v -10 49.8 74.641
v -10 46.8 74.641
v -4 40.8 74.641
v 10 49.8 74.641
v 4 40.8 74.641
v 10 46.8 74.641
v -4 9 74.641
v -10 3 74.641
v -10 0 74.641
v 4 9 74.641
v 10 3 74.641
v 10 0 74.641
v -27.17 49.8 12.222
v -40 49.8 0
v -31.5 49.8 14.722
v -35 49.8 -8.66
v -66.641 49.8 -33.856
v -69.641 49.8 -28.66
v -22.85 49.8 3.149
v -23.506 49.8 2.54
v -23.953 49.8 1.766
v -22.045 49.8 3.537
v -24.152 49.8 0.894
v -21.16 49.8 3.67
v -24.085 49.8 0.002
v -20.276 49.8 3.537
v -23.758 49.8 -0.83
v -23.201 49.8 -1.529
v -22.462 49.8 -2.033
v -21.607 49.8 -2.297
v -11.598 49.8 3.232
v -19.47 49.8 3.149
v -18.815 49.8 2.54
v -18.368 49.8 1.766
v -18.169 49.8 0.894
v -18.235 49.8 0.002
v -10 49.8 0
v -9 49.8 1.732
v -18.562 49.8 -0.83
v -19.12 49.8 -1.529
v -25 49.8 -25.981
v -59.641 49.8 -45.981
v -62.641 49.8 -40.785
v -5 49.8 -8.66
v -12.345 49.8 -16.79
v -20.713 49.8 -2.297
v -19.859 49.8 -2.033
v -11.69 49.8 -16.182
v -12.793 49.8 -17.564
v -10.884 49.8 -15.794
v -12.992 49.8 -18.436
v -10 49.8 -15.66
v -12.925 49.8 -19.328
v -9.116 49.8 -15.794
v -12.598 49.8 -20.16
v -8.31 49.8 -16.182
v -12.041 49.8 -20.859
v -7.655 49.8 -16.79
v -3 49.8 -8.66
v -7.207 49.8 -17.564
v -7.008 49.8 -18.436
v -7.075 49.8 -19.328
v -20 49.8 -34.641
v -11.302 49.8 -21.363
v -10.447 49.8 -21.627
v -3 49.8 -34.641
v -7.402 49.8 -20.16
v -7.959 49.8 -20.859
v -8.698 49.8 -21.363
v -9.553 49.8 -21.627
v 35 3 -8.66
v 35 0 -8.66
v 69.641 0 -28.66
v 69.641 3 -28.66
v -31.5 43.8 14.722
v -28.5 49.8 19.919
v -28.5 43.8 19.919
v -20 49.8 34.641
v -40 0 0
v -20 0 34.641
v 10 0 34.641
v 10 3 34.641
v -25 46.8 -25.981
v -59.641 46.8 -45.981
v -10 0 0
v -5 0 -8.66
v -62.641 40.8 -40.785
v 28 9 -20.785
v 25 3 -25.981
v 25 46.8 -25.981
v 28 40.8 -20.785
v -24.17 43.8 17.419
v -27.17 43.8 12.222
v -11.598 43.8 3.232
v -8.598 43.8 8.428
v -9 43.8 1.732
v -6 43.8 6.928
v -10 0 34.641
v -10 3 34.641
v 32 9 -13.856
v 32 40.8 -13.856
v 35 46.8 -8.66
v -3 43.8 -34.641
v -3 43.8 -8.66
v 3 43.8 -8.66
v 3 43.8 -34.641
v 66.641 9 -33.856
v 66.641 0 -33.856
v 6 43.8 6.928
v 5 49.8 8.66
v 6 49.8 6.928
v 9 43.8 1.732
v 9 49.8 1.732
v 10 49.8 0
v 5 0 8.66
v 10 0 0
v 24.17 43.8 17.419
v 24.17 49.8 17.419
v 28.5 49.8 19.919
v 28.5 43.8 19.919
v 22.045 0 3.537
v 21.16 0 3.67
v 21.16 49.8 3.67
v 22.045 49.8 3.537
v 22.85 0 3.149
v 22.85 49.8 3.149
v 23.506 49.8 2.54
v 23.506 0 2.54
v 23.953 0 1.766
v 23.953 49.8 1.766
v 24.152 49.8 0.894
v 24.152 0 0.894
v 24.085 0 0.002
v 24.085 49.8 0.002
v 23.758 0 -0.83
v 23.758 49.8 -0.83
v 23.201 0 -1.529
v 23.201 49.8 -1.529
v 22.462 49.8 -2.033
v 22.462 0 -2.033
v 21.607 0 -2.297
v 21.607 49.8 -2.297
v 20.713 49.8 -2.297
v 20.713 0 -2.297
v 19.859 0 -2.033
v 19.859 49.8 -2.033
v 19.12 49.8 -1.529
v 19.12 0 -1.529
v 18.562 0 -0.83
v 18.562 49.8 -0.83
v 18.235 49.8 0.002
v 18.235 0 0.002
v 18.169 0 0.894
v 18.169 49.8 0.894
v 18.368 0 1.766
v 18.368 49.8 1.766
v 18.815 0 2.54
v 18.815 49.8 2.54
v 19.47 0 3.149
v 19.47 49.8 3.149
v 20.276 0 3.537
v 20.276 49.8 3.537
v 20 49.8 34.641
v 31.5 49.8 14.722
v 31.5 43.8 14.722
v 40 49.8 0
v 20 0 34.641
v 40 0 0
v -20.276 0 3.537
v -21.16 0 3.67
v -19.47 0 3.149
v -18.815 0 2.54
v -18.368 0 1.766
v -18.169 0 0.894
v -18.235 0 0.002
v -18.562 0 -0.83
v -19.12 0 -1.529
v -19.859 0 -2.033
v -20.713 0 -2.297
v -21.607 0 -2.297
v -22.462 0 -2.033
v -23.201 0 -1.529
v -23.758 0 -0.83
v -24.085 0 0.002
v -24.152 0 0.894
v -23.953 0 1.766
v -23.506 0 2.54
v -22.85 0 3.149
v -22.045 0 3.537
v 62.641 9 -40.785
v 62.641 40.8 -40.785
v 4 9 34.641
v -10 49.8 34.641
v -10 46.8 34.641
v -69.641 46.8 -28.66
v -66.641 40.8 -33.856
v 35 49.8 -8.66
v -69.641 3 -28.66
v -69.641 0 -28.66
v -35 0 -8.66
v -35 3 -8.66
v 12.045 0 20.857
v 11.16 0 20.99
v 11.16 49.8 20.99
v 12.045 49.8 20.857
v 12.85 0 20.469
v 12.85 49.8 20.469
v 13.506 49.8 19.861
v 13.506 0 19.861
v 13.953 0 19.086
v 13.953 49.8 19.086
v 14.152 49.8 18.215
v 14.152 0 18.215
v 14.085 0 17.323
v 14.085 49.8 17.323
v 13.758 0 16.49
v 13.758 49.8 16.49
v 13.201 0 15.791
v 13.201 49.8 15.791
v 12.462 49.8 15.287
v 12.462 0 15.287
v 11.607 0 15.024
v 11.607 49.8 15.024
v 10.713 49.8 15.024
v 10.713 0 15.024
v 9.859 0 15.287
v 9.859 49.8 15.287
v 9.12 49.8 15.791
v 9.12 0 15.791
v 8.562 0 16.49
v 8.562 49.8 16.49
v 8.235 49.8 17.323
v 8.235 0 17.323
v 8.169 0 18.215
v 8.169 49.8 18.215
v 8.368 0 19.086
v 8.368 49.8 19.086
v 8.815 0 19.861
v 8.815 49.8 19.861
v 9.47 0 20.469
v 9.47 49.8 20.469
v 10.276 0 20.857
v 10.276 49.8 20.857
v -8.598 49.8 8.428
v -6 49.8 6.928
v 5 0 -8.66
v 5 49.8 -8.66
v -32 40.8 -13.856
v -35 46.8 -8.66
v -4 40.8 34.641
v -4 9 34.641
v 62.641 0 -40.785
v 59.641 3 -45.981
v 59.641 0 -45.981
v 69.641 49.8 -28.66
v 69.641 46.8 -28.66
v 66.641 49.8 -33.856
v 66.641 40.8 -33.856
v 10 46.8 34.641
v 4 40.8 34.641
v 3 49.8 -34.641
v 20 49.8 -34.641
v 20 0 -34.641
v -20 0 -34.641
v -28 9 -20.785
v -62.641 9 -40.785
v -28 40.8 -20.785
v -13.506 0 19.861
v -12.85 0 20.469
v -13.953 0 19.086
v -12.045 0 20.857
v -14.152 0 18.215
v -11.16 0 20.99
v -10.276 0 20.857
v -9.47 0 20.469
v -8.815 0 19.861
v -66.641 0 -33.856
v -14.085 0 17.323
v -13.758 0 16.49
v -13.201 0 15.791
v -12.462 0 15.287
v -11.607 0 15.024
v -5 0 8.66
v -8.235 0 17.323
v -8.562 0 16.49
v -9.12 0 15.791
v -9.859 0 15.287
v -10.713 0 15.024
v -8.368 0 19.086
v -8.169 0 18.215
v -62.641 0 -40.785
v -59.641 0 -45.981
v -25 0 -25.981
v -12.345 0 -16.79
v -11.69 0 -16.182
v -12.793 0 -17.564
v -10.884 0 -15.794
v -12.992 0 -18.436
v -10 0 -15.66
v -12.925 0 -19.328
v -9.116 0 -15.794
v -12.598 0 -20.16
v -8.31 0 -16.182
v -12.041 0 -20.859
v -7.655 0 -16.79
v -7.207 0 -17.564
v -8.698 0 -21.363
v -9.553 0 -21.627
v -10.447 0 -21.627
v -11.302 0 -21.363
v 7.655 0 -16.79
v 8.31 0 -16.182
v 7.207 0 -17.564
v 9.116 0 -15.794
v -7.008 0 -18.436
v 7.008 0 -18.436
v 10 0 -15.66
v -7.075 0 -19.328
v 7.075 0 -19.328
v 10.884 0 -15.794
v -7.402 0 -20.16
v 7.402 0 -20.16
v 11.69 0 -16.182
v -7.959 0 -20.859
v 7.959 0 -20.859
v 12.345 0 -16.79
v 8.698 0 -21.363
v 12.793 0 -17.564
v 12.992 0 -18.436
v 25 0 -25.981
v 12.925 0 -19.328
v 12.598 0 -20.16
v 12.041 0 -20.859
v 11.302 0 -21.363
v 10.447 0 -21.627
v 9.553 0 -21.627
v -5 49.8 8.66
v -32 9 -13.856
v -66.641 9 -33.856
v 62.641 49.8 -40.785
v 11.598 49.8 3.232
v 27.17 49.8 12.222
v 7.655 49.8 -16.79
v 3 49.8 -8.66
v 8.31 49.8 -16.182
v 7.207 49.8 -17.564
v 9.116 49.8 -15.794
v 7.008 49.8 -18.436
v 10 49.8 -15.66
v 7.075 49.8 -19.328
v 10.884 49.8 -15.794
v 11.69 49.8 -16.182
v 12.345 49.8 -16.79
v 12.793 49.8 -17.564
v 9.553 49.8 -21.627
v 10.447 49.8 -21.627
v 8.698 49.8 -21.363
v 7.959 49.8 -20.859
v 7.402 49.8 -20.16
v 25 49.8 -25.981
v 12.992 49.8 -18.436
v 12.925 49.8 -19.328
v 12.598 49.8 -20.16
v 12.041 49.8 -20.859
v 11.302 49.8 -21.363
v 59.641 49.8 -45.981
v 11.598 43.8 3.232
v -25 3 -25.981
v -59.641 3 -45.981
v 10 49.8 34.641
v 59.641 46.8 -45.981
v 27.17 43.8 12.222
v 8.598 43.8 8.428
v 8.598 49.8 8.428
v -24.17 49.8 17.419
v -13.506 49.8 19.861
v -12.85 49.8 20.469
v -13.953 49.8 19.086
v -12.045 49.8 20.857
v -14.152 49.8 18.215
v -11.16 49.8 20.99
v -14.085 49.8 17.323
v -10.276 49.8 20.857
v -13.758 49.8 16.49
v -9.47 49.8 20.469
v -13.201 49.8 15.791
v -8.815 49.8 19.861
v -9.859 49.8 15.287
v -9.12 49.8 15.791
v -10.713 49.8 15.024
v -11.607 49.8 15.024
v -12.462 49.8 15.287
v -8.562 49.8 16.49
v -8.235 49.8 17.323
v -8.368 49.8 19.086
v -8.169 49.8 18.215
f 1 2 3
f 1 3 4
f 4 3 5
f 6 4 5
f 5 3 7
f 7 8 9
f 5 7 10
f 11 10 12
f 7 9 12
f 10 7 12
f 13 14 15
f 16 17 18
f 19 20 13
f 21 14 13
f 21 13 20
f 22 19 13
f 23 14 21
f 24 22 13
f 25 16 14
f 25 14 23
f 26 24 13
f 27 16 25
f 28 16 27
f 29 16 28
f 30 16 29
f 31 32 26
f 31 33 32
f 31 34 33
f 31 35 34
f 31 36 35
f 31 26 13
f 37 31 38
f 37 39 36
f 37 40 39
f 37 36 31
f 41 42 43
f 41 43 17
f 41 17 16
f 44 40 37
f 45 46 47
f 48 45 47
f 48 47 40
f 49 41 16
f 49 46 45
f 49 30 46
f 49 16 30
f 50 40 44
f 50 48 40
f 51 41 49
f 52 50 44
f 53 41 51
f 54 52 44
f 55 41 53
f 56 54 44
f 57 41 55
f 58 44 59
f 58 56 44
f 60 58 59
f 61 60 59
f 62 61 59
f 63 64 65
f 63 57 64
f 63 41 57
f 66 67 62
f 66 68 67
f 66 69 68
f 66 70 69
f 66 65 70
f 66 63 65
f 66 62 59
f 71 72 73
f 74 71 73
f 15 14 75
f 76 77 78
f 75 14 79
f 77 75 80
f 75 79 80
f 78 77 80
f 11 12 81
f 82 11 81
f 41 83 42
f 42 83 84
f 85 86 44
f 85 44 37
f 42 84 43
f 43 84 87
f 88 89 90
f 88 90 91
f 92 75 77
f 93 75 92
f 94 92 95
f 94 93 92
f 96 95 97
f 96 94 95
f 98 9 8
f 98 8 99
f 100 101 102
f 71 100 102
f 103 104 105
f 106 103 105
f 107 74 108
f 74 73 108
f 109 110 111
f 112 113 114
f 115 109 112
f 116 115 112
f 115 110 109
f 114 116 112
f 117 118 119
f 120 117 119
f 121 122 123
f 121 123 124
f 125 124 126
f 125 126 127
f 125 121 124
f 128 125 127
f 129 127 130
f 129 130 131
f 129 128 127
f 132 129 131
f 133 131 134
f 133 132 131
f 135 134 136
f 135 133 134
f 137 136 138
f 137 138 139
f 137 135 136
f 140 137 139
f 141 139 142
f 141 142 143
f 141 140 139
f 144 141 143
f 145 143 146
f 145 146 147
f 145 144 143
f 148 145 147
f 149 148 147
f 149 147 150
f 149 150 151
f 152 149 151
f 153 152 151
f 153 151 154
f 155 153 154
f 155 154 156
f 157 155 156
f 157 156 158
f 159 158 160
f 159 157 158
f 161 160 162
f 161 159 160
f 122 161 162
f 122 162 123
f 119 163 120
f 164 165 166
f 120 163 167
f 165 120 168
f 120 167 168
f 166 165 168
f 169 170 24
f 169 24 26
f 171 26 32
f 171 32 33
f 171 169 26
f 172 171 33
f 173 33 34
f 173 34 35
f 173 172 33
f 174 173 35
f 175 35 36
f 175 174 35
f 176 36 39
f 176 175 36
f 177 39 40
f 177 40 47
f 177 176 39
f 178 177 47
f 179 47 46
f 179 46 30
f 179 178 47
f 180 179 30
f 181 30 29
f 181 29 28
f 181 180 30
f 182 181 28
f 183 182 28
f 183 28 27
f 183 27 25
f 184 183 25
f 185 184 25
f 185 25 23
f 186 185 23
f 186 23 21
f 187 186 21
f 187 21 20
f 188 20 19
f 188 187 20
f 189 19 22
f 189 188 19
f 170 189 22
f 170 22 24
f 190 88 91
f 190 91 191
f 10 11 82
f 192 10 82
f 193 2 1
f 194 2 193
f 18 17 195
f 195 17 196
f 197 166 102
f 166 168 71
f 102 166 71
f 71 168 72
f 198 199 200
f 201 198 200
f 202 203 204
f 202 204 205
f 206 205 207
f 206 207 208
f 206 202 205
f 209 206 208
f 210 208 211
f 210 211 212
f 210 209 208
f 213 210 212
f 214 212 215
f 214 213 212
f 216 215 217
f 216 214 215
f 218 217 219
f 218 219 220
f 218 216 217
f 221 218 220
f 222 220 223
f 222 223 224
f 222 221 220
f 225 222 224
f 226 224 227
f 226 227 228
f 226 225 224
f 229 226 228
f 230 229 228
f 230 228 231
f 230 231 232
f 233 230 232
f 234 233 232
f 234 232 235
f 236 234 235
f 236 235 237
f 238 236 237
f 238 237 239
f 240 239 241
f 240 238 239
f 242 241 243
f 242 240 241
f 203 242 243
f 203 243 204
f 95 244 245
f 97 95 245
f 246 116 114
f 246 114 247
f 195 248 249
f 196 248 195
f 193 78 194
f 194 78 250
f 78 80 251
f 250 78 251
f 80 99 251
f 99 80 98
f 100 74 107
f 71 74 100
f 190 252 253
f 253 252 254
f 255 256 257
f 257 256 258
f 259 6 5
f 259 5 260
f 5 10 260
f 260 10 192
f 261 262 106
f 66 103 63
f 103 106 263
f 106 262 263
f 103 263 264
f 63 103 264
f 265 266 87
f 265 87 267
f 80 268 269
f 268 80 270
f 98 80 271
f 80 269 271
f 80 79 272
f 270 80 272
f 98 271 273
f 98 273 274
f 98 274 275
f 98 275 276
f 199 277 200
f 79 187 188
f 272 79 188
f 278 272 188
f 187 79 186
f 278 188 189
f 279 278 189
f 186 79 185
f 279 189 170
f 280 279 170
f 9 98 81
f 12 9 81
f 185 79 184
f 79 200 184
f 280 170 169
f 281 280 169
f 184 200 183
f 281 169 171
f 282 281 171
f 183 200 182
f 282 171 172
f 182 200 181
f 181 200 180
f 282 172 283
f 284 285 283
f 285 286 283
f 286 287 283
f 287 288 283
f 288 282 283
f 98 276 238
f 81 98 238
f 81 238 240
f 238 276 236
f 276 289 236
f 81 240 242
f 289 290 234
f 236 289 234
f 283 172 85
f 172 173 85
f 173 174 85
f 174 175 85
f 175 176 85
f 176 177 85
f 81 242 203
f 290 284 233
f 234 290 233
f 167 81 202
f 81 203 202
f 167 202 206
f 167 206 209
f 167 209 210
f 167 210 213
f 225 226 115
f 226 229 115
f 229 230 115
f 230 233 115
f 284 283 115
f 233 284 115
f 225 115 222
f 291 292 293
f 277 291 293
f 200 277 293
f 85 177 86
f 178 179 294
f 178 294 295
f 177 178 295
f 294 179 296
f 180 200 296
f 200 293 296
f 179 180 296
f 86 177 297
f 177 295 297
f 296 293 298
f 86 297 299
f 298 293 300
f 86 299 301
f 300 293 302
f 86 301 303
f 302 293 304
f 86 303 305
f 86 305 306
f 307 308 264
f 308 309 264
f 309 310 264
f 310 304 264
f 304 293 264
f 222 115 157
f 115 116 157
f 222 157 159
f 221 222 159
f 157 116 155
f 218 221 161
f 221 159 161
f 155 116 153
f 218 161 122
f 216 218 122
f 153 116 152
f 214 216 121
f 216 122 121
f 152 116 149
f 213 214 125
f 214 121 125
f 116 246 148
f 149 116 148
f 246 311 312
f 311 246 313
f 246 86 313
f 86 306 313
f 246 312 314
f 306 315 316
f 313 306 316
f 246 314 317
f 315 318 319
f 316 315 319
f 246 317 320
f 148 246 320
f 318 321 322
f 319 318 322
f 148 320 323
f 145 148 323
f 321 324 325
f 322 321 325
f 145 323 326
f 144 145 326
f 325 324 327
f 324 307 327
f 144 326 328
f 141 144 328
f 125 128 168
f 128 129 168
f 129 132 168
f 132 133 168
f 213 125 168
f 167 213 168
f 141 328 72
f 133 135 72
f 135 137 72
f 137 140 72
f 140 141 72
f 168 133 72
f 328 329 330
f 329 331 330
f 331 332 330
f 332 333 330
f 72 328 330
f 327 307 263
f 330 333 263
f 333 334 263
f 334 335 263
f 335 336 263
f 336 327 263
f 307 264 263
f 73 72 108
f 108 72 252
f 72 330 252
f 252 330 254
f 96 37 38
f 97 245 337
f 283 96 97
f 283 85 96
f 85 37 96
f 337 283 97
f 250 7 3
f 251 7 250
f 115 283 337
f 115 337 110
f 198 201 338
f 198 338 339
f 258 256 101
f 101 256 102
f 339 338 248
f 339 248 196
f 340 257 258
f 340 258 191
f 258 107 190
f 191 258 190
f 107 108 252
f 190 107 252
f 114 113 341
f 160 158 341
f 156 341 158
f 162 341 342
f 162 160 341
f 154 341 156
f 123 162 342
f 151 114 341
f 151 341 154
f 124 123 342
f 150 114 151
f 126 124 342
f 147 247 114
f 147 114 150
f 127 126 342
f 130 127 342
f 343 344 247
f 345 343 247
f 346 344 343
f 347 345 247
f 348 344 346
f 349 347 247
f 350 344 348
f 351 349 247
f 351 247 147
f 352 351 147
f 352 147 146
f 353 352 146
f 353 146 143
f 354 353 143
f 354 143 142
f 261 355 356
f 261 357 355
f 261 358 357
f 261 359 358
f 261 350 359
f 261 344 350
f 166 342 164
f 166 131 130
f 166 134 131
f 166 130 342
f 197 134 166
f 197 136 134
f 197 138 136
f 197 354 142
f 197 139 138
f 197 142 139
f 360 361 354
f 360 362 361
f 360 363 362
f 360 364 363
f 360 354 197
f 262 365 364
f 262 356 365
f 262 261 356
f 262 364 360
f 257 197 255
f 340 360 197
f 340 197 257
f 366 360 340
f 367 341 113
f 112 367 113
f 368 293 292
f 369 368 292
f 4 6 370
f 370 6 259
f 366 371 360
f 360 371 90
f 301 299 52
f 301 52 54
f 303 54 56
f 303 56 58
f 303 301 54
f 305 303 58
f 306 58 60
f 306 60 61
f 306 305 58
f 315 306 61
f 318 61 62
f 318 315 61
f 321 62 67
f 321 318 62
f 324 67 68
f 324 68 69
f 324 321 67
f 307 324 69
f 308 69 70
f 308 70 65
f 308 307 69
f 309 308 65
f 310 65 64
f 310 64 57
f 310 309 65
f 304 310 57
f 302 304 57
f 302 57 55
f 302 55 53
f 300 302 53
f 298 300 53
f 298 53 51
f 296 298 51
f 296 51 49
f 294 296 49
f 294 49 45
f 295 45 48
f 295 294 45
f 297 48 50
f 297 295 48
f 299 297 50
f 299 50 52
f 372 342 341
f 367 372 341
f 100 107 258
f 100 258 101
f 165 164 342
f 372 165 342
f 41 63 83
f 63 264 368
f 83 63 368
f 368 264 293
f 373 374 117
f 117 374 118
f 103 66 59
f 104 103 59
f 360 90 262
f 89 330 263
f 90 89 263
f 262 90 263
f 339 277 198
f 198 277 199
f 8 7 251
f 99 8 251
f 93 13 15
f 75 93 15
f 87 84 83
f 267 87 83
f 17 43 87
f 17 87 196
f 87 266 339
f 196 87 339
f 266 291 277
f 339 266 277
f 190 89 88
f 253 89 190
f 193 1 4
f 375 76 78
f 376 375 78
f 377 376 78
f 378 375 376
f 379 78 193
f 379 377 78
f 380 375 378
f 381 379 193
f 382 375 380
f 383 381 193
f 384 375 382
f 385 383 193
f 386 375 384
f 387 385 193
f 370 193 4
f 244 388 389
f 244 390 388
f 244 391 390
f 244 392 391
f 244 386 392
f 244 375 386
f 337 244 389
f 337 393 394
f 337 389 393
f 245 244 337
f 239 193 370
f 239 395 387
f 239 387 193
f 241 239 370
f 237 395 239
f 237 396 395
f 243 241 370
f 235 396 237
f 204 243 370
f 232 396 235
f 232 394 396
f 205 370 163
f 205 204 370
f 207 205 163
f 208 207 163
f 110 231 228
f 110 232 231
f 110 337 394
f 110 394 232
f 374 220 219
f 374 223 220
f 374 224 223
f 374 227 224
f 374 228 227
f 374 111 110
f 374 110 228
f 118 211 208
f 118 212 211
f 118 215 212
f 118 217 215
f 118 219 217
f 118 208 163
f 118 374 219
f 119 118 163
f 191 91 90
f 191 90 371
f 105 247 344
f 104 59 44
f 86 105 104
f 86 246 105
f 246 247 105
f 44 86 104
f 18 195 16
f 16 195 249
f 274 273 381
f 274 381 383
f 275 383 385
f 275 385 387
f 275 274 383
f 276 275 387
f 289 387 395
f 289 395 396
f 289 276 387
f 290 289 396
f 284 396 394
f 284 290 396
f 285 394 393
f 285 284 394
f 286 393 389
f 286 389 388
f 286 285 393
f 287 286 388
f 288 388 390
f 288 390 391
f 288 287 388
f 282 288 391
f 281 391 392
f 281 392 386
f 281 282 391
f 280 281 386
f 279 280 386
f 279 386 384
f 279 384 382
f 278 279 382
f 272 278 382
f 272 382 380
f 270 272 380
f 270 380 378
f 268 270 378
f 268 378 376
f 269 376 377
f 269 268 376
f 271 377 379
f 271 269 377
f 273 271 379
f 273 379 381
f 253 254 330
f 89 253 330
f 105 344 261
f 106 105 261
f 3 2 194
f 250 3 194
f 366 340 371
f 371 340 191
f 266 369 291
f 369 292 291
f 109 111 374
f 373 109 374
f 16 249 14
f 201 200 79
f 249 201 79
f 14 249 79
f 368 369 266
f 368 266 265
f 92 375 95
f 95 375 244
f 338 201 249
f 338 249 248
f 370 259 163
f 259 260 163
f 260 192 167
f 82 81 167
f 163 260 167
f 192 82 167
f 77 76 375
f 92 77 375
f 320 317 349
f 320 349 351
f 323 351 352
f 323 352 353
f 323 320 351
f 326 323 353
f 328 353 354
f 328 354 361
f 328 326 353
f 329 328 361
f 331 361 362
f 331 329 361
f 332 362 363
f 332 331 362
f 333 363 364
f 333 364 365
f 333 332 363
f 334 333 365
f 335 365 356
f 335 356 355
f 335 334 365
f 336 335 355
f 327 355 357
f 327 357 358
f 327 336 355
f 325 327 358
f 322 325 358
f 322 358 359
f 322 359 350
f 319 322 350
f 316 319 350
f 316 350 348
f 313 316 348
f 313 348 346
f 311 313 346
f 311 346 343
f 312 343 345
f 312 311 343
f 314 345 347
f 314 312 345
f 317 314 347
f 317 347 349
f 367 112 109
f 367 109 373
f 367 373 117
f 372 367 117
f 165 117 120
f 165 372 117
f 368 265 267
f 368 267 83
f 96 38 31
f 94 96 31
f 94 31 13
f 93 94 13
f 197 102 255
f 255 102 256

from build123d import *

# Parameters (mm, degrees)
SKETCH1_R           = 3
SKETCH1_W           = 6
SKETCH1_H           = 40
SKETCH1_W_2         = 8
BOSS_EXTRUDE1_DEPTH = 49.8
SKETCH1_4_W         = 6
SKETCH1_4_H         = 40
CUT_EXTRUDE2_DEPTH  = 46.8
SKETCH1_5_W         = 6
SKETCH1_5_H         = 40
BOSS_EXTRUDE3_DEPTH = 3
CHAMFER1_SIZE       = 6
SKETCH2_3_W         = 6
SKETCH2_3_H         = 17.980762113
SKETCH2_3_H_2       = 3
SKETCH2_3_H_3       = 5
CUT_EXTRUDE3_DEPTH  = 6


with BuildPart() as part:
    # Sketch1 → Boss-Extrude1 (new body)
    # profile 1 of 10: a face of its own
    with BuildSketch(Plane(origin=(0, 0, 0), x_dir=(1, 0, 0), z_dir=(0, 1, 0))):
        Polygon((20, -34.641016151), (40, 0), (20, 34.641016151), (-20, 34.641016151), (-40, 0), (-20, -34.641016151), align=None)
        with Locations(Location((21.160254038, -0.669872981, 0), (0, 0, 270))):
            Circle(SKETCH1_R, mode=Mode.SUBTRACT)
        with Locations(Location((10, 18.660254038, 0), (0, 0, 270))):
            Circle(SKETCH1_R, mode=Mode.SUBTRACT)
        with Locations(Location((-10, 18.660254038, 0), (0, 0, 270))):
            Circle(SKETCH1_R, mode=Mode.SUBTRACT)
        with Locations(Location((-21.160254038, -0.669872981, 0), (0, 0, 270))):
            Circle(SKETCH1_R, mode=Mode.SUBTRACT)
        with Locations(Location((11.160254038, -17.990381057, 0), (0, 0, 270))):
            Circle(SKETCH1_R, mode=Mode.SUBTRACT)
        with Locations(Location((-11.160254038, -17.990381057, 0), (0, 0, 270))):
            Circle(SKETCH1_R, mode=Mode.SUBTRACT)
        Polygon((10, 0), (5, 8.660254038), (-5, 8.660254038), (-10, 0), (-5, -8.660254038), (5, -8.660254038), align=None, mode=Mode.SUBTRACT)
    # profile 2 of 10: a face of its own
    with BuildSketch(Plane(origin=(0, 0, 0), x_dir=(1, 0, 0), z_dir=(0, 1, 0))):
        Polygon((-28, 20.784609691), (-25, 25.980762114), (-59.641016151, 45.980762114), (-62.641016151, 40.784609691), align=None)
    # profile 3 of 10: a face of its own
    with BuildSketch(Plane(origin=(0, 0, 0), x_dir=(1, 0, 0), z_dir=(0, 1, 0))):
        Polygon((-32, 13.856406461), (-28, 20.784609691), (-62.641016151, 40.784609691), (-66.641016151, 33.856406461), align=None)
    # profile 4 of 10: a face of its own
    with BuildSketch(Plane(origin=(0, 0, 0), x_dir=(1, 0, 0), z_dir=(0, 1, 0))):
        Polygon((-35, 8.660254038), (-32, 13.856406461), (-66.641016151, 33.856406461), (-69.641016151, 28.660254038), align=None)
    # profile 5 of 10: a face of its own
    with BuildSketch(Plane(origin=(0, 0, 0), x_dir=(1, 0, 0), z_dir=(0, 1, 0))):
        Polygon((59.641016151, 45.980762114), (25, 25.980762114), (28, 20.784609691), (62.641016151, 40.784609691), align=None)
    # profile 6 of 10: a face of its own
    with BuildSketch(Plane(origin=(0, 0, 0), x_dir=(1, 0, 0), z_dir=(0, 1, 0))):
        Polygon((62.641016151, 40.784609691), (28, 20.784609691), (32, 13.856406461), (66.641016151, 33.856406461), align=None)
    # profile 7 of 10: a face of its own
    with BuildSketch(Plane(origin=(0, 0, 0), x_dir=(1, 0, 0), z_dir=(0, 1, 0))):
        Polygon((66.641016151, 33.856406461), (32, 13.856406461), (35, 8.660254038), (69.641016151, 28.660254038), align=None)
    # profile 8 of 10: a face of its own
    with BuildSketch(Plane(origin=(0, 0, 0), x_dir=(1, 0, 0), z_dir=(0, 1, 0))):
        with Locations((7, -54.641016151)):
            Rectangle(SKETCH1_W, SKETCH1_H)
    # profile 9 of 10: a face of its own
    with BuildSketch(Plane(origin=(0, 0, 0), x_dir=(1, 0, 0), z_dir=(0, 1, 0))):
        with Locations((-7, -54.641016151)):
            Rectangle(SKETCH1_W, SKETCH1_H)
    # profile 10 of 10: a face of its own
    with BuildSketch(Plane(origin=(0, 0, 0), x_dir=(1, 0, 0), z_dir=(0, 1, 0))):
        with Locations((0, -54.641016151)):
            Rectangle(SKETCH1_W_2, SKETCH1_H)
    extrude(amount=BOSS_EXTRUDE1_DEPTH)

    # Sketch1<4> → Cut-Extrude2 (cut)
    with BuildSketch(Plane(origin=(0, 0, 0), x_dir=(1, 0, 0), z_dir=(0, 1, 0))):
        Polygon((59.641016151, 45.980762114), (25, 25.980762114), (28, 20.784609691), (62.641016151, 40.784609691), align=None)
        Polygon((-28, 20.784609691), (-25, 25.980762114), (-59.641016151, 45.980762114), (-62.641016151, 40.784609691), align=None)
        Polygon((66.641016151, 33.856406461), (32, 13.856406461), (35, 8.660254038), (69.641016151, 28.660254038), align=None)
        Polygon((-35, 8.660254038), (-32, 13.856406461), (-66.641016151, 33.856406461), (-69.641016151, 28.660254038), align=None)
        with Locations((7, -54.641016151)):
            Rectangle(SKETCH1_4_W, SKETCH1_4_H)
        with Locations((-7, -54.641016151)):
            Rectangle(SKETCH1_4_W, SKETCH1_4_H)
    extrude(amount=CUT_EXTRUDE2_DEPTH, mode=Mode.SUBTRACT)

    # Sketch1<5> → Boss-Extrude3 (add)
    with BuildSketch(Plane(origin=(0, 0, 0), x_dir=(1, 0, 0), z_dir=(0, 1, 0))):
        with Locations((-7, -54.641016151)):
            Rectangle(SKETCH1_5_W, SKETCH1_5_H)
        with Locations((7, -54.641016151)):
            Rectangle(SKETCH1_5_W, SKETCH1_5_H)
        Polygon((-35, 8.660254038), (-32, 13.856406461), (-66.641016151, 33.856406461), (-69.641016151, 28.660254038), align=None)
        Polygon((-28, 20.784609691), (-25, 25.980762114), (-59.641016151, 45.980762114), (-62.641016151, 40.784609691), align=None)
        Polygon((66.641016151, 33.856406461), (32, 13.856406461), (35, 8.660254038), (69.641016151, 28.660254038), align=None)
        Polygon((59.641016151, 45.980762114), (25, 25.980762114), (28, 20.784609691), (62.641016151, 40.784609691), align=None)
    extrude(amount=BOSS_EXTRUDE3_DEPTH)

    # Chamfer1
    chamfer1_edges = [part.edges().sort_by_distance(p)[0] for p in [
        (-45.320508076, 46.8, -30.784609691),
        (-45.320508076, 3, -30.784609691),
        (-49.320508076, 46.8, -23.856406461),
        (-49.320508076, 3, -23.856406461),
        (49.320508076, 46.8, -23.856406461),
        (45.320508076, 46.8, -30.784609691),
        (45.320508076, 3, -30.784609691),
        (49.320508076, 3, -23.856406461),
        (-4, 3, 54.641016151),
        (4, 3, 54.641016151),
        (4, 46.8, 54.641016151),
        (-4, 46.8, 54.641016151),
    ]]
    chamfer(chamfer1_edges, length=CHAMFER1_SIZE - 0.0001)  # a hair under: the kernel refuses the full size

    # Sketch2<3> → Cut-Extrude3 (cut)
    with BuildSketch(Plane(origin=(0, 49.8, 0), x_dir=(1, 0, 0), z_dir=(0, 1, 0))):
        Polygon((-24.169872981, -17.418584287), (-27.169872981, -12.222431864), (-31.5, -14.722431864), (-28.5, -19.918584287), align=None)
        Polygon((-9, -1.732050808), (-11.598076211, -3.232050808), (-8.598076211, -8.42820323), (-6, -6.92820323), align=None)
        Polygon((8.598076211, -8.42820323), (11.598076211, -3.232050808), (9, -1.732050808), (6, -6.92820323), align=None)
        Polygon((31.5, -14.722431864), (27.169872981, -12.222431864), (24.169872981, -17.418584287), (28.5, -19.918584287), align=None)
        Polygon((27.169872981, -12.222431864), (11.598076211, -3.232050808), (8.598076211, -8.42820323), (24.169872981, -17.418584287), align=None)
        Polygon((-11.598076211, -3.232050808), (-27.169872981, -12.222431864), (-24.169872981, -17.418584287), (-8.598076211, -8.42820323), align=None)
        with Locations((0, 20.650635095)):
            Rectangle(SKETCH2_3_W, SKETCH2_3_H)
        with Locations((0, 10.160254038)):
            Rectangle(SKETCH2_3_W, SKETCH2_3_H_2)
        with Locations((0, 32.141016151)):
            Rectangle(SKETCH2_3_W, SKETCH2_3_H_3)
    extrude(amount=-CUT_EXTRUDE3_DEPTH, mode=Mode.SUBTRACT)


solid = part.part
